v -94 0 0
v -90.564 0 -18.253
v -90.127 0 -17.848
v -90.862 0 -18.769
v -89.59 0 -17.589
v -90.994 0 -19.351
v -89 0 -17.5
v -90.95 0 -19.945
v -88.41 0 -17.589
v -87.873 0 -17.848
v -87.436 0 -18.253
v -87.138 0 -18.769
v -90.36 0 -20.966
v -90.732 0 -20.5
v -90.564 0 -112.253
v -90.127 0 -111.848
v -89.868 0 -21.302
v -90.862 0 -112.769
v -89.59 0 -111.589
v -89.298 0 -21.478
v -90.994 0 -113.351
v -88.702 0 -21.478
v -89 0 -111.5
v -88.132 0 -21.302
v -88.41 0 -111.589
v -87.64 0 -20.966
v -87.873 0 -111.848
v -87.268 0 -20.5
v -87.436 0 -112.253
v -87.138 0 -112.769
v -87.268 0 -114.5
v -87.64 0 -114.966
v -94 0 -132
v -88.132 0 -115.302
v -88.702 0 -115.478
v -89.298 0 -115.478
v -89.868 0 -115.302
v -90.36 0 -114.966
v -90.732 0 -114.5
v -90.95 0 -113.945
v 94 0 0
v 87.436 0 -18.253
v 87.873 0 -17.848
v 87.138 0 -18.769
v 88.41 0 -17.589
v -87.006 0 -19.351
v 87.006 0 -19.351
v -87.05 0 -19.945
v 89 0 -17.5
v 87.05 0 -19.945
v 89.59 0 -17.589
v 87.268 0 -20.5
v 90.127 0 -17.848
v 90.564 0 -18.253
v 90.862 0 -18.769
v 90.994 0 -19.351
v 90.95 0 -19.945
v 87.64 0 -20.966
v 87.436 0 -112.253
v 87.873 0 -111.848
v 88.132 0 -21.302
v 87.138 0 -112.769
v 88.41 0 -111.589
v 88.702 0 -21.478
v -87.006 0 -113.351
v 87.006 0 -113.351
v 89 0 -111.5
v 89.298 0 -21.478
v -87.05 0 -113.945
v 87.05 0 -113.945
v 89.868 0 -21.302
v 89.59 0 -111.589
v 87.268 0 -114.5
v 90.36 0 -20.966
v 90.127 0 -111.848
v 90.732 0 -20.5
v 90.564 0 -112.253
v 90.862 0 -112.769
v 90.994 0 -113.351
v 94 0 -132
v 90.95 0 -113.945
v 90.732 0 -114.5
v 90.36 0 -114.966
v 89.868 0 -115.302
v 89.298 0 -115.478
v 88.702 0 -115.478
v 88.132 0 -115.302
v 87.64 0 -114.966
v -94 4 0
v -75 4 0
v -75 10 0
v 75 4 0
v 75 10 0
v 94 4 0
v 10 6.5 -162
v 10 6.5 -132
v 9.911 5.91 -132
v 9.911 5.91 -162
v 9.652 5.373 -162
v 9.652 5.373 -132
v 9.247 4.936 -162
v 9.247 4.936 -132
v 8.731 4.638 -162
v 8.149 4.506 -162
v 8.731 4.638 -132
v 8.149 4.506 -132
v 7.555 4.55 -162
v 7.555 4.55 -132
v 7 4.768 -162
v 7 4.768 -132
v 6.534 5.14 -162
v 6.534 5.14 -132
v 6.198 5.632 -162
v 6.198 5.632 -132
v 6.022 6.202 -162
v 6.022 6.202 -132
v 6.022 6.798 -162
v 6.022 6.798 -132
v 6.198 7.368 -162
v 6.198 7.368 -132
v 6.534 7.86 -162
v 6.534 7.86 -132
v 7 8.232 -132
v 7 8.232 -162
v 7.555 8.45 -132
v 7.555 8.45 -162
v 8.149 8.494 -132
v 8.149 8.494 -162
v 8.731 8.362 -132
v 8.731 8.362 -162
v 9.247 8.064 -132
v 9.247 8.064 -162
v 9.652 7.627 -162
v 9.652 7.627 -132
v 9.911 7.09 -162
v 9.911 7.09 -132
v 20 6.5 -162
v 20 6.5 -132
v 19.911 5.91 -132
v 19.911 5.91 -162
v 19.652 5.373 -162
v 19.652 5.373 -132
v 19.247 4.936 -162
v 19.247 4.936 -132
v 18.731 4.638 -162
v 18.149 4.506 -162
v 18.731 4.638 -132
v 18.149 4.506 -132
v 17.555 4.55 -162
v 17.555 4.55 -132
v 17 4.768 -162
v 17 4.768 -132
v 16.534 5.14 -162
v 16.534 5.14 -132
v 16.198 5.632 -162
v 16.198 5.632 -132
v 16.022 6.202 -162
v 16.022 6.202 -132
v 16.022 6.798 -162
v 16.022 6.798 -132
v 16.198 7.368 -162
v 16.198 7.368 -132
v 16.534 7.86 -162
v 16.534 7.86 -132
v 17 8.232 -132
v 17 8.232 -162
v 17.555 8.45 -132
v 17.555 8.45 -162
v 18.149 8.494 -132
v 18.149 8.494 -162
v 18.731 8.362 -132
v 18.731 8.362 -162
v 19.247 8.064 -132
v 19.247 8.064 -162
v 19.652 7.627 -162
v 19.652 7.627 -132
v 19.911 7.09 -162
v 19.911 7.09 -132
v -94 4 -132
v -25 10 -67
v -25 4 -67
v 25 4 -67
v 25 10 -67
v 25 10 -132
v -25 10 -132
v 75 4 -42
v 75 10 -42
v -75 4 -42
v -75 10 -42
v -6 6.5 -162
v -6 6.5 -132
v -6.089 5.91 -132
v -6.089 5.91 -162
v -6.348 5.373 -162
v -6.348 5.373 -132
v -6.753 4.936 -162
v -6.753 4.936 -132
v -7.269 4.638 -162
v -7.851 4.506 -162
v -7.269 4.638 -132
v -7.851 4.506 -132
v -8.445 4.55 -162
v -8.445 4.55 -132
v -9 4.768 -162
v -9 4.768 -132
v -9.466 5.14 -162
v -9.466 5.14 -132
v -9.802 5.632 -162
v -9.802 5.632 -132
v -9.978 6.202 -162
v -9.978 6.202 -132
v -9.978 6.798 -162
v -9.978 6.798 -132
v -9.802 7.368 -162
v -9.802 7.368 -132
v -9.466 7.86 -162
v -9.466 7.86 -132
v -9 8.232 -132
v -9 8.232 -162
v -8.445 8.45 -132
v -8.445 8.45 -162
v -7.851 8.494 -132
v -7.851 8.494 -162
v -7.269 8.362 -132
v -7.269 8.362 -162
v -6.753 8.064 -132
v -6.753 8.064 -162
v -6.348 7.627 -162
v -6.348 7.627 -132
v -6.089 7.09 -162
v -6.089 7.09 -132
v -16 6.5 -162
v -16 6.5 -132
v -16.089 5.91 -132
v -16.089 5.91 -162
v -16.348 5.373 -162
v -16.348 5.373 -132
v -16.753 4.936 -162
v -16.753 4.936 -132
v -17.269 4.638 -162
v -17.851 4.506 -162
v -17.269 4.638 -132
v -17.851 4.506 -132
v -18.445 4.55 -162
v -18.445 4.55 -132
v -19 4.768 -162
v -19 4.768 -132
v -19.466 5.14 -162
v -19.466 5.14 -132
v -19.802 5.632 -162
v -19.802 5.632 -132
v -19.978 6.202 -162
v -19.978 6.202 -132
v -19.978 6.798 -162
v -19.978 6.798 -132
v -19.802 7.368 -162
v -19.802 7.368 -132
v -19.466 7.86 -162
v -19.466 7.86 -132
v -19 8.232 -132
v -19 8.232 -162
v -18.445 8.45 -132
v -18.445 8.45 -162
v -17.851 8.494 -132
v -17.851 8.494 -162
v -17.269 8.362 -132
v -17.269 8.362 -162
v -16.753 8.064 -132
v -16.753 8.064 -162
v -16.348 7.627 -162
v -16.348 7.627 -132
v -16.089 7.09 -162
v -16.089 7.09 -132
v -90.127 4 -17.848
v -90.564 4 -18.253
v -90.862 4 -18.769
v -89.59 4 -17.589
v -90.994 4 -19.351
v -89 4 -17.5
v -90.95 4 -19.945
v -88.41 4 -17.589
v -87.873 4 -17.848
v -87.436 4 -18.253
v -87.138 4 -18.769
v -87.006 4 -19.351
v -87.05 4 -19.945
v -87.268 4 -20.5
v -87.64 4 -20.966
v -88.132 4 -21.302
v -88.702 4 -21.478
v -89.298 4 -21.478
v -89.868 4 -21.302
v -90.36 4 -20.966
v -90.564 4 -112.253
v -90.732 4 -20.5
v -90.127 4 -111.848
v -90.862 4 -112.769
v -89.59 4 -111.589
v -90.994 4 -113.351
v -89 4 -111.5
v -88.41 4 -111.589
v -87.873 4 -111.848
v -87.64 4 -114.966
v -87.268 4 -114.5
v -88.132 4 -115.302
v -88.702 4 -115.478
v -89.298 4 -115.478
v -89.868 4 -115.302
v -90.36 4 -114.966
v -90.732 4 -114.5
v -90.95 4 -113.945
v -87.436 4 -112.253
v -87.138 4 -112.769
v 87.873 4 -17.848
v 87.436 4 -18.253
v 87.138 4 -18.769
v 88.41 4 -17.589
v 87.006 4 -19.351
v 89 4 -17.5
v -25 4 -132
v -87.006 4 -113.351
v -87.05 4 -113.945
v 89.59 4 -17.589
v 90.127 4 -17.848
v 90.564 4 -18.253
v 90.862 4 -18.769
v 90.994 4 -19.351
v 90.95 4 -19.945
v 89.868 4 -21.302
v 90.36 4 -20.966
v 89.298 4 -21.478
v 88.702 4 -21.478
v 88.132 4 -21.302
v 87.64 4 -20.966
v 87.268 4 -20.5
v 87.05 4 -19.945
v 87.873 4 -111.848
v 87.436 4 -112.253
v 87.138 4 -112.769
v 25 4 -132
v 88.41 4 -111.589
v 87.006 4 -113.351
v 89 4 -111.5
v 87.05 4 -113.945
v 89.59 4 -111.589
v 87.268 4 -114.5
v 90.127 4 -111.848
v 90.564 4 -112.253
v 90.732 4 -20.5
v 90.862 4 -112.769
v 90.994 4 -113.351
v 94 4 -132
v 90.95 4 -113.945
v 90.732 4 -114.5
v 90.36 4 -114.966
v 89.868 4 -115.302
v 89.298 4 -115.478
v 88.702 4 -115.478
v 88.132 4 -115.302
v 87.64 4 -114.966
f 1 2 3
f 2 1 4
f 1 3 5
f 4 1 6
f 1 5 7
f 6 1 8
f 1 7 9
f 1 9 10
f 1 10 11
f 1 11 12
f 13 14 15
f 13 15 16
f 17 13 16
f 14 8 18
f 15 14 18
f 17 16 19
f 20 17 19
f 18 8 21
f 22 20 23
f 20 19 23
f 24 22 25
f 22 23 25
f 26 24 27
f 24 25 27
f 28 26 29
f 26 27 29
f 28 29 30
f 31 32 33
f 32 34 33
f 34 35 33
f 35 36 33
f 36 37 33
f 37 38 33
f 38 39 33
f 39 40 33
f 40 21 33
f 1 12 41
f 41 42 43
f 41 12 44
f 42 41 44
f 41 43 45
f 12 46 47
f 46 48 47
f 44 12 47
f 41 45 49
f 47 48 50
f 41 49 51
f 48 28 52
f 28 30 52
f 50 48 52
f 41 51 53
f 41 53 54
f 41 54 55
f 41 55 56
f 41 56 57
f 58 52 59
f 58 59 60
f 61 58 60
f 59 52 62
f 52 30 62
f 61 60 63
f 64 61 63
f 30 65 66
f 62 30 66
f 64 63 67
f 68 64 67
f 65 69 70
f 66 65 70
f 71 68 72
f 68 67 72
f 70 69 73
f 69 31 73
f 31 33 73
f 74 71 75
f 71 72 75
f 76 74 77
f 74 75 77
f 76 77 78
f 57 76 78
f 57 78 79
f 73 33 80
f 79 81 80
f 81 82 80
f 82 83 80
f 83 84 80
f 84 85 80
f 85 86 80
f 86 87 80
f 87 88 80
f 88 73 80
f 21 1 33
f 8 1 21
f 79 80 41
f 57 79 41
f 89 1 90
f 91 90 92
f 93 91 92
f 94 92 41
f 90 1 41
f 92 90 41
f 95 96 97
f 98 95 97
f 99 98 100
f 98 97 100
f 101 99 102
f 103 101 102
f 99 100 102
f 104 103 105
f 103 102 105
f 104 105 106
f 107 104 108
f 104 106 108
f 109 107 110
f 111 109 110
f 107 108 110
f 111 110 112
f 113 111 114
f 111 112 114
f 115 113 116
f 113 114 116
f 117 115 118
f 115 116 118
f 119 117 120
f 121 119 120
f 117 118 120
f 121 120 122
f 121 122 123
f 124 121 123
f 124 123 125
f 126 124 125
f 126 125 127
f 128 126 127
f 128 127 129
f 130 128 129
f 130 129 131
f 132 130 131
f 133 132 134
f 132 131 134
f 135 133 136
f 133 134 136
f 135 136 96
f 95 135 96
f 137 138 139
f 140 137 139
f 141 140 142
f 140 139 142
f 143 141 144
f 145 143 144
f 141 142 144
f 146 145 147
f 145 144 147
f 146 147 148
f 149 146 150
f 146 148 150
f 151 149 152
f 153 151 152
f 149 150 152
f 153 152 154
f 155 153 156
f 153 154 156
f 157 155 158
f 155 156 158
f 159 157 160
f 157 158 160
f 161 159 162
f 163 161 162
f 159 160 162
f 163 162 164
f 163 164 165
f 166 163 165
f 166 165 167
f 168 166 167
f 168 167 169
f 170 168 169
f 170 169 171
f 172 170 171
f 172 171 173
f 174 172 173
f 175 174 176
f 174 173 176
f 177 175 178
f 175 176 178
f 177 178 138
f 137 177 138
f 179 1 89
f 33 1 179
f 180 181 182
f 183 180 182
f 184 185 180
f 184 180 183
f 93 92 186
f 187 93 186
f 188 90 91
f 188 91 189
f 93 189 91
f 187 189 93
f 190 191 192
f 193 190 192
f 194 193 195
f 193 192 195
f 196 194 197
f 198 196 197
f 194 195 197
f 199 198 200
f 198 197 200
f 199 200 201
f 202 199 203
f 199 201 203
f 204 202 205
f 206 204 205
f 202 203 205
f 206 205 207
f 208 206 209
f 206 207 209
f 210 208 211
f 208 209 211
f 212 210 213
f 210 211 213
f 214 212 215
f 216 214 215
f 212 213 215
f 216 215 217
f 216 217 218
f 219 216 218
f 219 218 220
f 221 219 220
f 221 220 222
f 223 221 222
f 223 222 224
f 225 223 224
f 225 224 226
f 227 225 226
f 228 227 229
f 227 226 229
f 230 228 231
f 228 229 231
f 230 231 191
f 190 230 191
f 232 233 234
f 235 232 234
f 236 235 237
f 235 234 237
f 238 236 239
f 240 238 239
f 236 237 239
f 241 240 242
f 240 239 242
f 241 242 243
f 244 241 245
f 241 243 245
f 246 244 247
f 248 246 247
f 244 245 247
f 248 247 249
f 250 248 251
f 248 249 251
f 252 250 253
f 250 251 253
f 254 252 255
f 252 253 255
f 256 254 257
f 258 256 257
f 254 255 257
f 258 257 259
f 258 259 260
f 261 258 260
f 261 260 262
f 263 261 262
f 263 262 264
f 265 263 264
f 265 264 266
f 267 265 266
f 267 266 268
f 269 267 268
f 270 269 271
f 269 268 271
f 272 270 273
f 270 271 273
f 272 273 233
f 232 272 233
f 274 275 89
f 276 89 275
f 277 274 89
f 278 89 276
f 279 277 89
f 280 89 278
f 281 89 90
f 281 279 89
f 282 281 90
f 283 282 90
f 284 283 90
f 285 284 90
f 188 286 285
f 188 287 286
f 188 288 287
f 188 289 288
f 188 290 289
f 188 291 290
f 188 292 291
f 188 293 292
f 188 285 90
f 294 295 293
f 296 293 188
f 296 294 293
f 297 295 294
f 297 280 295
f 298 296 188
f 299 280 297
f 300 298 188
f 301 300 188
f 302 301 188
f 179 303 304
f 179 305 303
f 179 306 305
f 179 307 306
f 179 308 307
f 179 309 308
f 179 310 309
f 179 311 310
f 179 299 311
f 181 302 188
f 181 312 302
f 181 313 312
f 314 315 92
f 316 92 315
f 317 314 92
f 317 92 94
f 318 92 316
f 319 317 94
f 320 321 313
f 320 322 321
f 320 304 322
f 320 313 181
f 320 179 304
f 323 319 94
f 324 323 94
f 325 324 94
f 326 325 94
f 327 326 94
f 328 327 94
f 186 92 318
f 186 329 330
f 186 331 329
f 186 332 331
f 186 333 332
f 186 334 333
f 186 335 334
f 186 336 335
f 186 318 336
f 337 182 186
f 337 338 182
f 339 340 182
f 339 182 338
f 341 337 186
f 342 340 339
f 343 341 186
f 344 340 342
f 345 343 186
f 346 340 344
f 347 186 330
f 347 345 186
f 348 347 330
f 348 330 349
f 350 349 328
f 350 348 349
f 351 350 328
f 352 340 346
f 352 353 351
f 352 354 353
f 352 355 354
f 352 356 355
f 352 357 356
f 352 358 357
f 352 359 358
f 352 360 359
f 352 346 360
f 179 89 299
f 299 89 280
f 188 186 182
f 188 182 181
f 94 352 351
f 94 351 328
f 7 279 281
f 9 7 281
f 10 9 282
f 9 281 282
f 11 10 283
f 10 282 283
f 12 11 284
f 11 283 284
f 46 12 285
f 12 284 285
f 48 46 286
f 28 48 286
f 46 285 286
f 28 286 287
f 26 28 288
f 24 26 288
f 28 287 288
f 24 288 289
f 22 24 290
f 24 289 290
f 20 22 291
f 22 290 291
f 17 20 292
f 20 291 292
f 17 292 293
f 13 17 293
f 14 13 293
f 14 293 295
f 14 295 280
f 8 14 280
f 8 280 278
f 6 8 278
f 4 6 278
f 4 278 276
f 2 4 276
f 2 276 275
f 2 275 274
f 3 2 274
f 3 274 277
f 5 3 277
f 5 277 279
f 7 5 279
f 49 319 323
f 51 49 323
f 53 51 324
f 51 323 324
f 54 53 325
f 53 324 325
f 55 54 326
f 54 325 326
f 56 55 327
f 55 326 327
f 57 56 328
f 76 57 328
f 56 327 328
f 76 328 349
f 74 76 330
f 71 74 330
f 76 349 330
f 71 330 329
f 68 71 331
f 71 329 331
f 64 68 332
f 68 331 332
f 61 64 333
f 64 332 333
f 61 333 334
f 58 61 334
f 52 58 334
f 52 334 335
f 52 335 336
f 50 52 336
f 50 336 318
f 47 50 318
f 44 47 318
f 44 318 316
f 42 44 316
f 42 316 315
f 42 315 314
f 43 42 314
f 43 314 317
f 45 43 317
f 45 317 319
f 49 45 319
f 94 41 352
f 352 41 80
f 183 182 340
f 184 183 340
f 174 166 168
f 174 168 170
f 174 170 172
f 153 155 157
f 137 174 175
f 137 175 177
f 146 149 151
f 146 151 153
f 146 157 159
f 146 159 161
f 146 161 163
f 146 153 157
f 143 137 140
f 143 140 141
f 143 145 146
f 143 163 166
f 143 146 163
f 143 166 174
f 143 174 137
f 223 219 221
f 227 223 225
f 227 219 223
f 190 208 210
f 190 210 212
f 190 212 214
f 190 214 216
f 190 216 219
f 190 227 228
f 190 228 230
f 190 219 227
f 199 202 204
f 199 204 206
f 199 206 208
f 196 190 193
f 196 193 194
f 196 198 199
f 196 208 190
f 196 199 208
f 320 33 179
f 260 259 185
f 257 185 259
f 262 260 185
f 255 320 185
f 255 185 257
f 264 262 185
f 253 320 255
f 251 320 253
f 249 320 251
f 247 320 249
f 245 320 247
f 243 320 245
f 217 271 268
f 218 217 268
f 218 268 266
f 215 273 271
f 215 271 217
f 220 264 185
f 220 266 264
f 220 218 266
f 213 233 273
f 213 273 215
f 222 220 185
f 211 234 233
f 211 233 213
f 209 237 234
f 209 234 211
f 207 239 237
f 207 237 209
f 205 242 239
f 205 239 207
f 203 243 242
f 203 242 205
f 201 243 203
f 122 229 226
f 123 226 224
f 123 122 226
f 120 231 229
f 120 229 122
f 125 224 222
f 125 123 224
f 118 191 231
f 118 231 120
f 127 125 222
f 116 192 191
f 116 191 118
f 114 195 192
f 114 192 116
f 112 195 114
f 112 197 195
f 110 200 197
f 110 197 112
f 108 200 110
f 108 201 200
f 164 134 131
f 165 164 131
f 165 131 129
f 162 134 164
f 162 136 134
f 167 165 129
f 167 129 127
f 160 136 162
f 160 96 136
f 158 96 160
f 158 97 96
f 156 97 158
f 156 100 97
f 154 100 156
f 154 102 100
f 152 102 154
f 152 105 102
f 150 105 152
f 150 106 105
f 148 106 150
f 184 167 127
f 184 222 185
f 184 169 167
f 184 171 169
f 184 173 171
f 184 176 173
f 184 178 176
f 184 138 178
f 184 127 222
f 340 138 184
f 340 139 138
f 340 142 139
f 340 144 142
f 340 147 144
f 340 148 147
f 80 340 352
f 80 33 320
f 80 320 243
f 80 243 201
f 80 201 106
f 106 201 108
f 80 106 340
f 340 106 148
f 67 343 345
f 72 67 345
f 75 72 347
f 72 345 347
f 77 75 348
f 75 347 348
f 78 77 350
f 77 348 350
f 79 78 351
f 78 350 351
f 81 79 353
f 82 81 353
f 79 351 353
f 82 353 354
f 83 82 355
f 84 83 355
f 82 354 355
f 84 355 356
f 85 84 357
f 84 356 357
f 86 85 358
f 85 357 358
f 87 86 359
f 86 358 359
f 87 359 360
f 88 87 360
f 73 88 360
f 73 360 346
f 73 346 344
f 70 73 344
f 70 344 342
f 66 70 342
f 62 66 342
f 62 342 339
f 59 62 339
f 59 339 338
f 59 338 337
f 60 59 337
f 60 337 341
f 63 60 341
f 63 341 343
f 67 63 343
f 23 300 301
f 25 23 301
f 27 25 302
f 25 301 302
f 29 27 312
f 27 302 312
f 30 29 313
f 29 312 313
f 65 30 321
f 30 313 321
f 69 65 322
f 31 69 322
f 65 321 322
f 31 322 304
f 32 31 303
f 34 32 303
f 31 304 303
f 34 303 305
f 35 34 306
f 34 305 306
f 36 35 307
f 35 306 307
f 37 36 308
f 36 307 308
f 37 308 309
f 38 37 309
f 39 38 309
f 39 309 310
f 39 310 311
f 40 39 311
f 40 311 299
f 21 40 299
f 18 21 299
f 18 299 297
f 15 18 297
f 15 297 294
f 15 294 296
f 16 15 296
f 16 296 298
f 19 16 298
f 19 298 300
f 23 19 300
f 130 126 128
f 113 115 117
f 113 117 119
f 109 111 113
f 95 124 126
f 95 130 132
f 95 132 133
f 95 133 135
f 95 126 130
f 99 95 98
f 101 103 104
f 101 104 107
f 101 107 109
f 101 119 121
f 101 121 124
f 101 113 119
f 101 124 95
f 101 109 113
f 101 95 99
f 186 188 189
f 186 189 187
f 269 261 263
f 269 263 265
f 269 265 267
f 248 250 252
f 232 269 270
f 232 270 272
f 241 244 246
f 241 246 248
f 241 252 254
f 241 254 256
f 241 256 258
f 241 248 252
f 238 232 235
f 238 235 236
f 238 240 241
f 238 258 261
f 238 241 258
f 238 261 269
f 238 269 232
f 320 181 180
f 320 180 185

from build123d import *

# Parameters (mm, degrees)
SKETCH_1_W          = 188
SKETCH_1_H          = 132
EXTRUDE_1_DEPTH     = 4
SKETCH_2_W          = 50
SKETCH_2_H          = 65
SKETCH_2_W_2        = 150
SKETCH_2_H_2        = 42
EXTRUDE_2_DEPTH     = 6
SKETCH_3_R          = 2
EXTRUDE_3_DEPTH     = 30
SKETCH_4_R          = 2
CUT_EXTRUDE_1_DEPTH = 10


with BuildPart() as part:
    # 草图1 → 凸台-拉伸1 (new body)
    with BuildSketch(Plane(origin=(0, 0, 0), x_dir=(1, 0, 0), z_dir=(0, 1, 0))):
        with Locations((0, 66)):
            Rectangle(SKETCH_1_W, SKETCH_1_H)
    extrude(amount=EXTRUDE_1_DEPTH)

    # 草图2 → 凸台-拉伸2 (add)
    with BuildSketch(Plane(origin=(0, 4, 0), x_dir=(1, 0, 0), z_dir=(0, 1, 0))):
        with Locations((0, 99.5)):
            Rectangle(SKETCH_2_W, SKETCH_2_H)
        with Locations((0, 21)):
            Rectangle(SKETCH_2_W_2, SKETCH_2_H_2)
    extrude(amount=EXTRUDE_2_DEPTH)

    # 草图3 → 凸台-拉伸3 (add)
    with BuildSketch(Plane(origin=(0, 0, -132), x_dir=(-1, 0, 0), z_dir=(0, 0, -1))):
        with Locations(Location((-18, 6.5, 0), (0, 0, 180))):
            Circle(SKETCH_3_R)
        with Locations(Location((-8, 6.5, 0), (0, 0, 180))):
            Circle(SKETCH_3_R)
        with Locations(Location((8, 6.5, 0), (0, 0, 180))):
            Circle(SKETCH_3_R)
        with Locations(Location((18, 6.5, 0), (0, 0, 180))):
            Circle(SKETCH_3_R)
    extrude(amount=EXTRUDE_3_DEPTH)

    # 草图4 → 切除-拉伸1 (cut)
    with BuildSketch(Plane(origin=(0, 4, 0), x_dir=(1, 0, 0), z_dir=(0, 1, 0))):
        with Locations(Location((89, 113.5, 0), (0, 0, 270))):
            Circle(SKETCH_4_R)
        with Locations(Location((89, 19.5, 0), (0, 0, 270))):
            Circle(SKETCH_4_R)
        with Locations(Location((-89, 19.5, 0), (0, 0, 270))):
            Circle(SKETCH_4_R)
        with Locations(Location((-89, 113.5, 0), (0, 0, 270))):
            Circle(SKETCH_4_R)
    extrude(amount=-CUT_EXTRUDE_1_DEPTH, mode=Mode.SUBTRACT)


solid = part.part
